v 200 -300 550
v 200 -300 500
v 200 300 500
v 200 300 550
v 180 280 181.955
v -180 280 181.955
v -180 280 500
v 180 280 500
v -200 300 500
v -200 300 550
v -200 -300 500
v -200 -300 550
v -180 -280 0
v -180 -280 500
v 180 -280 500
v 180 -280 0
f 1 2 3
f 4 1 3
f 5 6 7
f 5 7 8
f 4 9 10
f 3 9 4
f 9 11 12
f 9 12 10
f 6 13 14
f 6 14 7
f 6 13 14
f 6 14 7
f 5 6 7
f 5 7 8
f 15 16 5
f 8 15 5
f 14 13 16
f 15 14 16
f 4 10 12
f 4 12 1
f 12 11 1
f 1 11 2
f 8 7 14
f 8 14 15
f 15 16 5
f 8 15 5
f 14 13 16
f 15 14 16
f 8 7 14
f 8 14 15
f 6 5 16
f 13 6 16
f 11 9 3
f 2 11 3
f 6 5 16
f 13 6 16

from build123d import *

# Parameters (mm, degrees)
F0_W     = 360
F0_H     = 560
F2_DEPTH = 500
F1_W     = 360
F1_H     = 560
F3_W     = 400
F3_H     = 600
F4_DEPTH = 50
F6_DEPTH = 800


with BuildPart() as f2:
    # F0 (on Top) → F2 (new body)
    with BuildSketch(Plane.XY):
        Rectangle(F0_W, F0_H)
    extrude(amount=F2_DEPTH)


with BuildPart() as f2b:
    # F1 (on face) → F2, piece 2 (new body)
    with BuildSketch(Plane.XY):
        Rectangle(F1_W, F1_H)
    extrude(amount=F2_DEPTH)


with BuildPart() as f4:
    # F3 (on face) → F4 (new body)
    with BuildSketch(Plane.XY.offset(500)):
        Rectangle(F3_W, F3_H)
    extrude(amount=F4_DEPTH)


with BuildPart() as f6_tool:
    # F5 (on face) → F6 (new body)
    with BuildSketch(Plane.YZ.offset(180)):
        Polygon((280, 181.9550298904), (-280, 0), (280, 0), align=None)
    extrude(amount=-F6_DEPTH)


with BuildPart() as f2_1:
    add(f2.part)

    # F6: cut by f6_tool
    add(f6_tool.part, mode=Mode.SUBTRACT)


with BuildPart() as f2b_1:
    add(f2b.part)

    # F6: cut by f6_tool
    add(f6_tool.part, mode=Mode.SUBTRACT)


solid = Compound([f4.part, f2_1.part, f2b_1.part])
